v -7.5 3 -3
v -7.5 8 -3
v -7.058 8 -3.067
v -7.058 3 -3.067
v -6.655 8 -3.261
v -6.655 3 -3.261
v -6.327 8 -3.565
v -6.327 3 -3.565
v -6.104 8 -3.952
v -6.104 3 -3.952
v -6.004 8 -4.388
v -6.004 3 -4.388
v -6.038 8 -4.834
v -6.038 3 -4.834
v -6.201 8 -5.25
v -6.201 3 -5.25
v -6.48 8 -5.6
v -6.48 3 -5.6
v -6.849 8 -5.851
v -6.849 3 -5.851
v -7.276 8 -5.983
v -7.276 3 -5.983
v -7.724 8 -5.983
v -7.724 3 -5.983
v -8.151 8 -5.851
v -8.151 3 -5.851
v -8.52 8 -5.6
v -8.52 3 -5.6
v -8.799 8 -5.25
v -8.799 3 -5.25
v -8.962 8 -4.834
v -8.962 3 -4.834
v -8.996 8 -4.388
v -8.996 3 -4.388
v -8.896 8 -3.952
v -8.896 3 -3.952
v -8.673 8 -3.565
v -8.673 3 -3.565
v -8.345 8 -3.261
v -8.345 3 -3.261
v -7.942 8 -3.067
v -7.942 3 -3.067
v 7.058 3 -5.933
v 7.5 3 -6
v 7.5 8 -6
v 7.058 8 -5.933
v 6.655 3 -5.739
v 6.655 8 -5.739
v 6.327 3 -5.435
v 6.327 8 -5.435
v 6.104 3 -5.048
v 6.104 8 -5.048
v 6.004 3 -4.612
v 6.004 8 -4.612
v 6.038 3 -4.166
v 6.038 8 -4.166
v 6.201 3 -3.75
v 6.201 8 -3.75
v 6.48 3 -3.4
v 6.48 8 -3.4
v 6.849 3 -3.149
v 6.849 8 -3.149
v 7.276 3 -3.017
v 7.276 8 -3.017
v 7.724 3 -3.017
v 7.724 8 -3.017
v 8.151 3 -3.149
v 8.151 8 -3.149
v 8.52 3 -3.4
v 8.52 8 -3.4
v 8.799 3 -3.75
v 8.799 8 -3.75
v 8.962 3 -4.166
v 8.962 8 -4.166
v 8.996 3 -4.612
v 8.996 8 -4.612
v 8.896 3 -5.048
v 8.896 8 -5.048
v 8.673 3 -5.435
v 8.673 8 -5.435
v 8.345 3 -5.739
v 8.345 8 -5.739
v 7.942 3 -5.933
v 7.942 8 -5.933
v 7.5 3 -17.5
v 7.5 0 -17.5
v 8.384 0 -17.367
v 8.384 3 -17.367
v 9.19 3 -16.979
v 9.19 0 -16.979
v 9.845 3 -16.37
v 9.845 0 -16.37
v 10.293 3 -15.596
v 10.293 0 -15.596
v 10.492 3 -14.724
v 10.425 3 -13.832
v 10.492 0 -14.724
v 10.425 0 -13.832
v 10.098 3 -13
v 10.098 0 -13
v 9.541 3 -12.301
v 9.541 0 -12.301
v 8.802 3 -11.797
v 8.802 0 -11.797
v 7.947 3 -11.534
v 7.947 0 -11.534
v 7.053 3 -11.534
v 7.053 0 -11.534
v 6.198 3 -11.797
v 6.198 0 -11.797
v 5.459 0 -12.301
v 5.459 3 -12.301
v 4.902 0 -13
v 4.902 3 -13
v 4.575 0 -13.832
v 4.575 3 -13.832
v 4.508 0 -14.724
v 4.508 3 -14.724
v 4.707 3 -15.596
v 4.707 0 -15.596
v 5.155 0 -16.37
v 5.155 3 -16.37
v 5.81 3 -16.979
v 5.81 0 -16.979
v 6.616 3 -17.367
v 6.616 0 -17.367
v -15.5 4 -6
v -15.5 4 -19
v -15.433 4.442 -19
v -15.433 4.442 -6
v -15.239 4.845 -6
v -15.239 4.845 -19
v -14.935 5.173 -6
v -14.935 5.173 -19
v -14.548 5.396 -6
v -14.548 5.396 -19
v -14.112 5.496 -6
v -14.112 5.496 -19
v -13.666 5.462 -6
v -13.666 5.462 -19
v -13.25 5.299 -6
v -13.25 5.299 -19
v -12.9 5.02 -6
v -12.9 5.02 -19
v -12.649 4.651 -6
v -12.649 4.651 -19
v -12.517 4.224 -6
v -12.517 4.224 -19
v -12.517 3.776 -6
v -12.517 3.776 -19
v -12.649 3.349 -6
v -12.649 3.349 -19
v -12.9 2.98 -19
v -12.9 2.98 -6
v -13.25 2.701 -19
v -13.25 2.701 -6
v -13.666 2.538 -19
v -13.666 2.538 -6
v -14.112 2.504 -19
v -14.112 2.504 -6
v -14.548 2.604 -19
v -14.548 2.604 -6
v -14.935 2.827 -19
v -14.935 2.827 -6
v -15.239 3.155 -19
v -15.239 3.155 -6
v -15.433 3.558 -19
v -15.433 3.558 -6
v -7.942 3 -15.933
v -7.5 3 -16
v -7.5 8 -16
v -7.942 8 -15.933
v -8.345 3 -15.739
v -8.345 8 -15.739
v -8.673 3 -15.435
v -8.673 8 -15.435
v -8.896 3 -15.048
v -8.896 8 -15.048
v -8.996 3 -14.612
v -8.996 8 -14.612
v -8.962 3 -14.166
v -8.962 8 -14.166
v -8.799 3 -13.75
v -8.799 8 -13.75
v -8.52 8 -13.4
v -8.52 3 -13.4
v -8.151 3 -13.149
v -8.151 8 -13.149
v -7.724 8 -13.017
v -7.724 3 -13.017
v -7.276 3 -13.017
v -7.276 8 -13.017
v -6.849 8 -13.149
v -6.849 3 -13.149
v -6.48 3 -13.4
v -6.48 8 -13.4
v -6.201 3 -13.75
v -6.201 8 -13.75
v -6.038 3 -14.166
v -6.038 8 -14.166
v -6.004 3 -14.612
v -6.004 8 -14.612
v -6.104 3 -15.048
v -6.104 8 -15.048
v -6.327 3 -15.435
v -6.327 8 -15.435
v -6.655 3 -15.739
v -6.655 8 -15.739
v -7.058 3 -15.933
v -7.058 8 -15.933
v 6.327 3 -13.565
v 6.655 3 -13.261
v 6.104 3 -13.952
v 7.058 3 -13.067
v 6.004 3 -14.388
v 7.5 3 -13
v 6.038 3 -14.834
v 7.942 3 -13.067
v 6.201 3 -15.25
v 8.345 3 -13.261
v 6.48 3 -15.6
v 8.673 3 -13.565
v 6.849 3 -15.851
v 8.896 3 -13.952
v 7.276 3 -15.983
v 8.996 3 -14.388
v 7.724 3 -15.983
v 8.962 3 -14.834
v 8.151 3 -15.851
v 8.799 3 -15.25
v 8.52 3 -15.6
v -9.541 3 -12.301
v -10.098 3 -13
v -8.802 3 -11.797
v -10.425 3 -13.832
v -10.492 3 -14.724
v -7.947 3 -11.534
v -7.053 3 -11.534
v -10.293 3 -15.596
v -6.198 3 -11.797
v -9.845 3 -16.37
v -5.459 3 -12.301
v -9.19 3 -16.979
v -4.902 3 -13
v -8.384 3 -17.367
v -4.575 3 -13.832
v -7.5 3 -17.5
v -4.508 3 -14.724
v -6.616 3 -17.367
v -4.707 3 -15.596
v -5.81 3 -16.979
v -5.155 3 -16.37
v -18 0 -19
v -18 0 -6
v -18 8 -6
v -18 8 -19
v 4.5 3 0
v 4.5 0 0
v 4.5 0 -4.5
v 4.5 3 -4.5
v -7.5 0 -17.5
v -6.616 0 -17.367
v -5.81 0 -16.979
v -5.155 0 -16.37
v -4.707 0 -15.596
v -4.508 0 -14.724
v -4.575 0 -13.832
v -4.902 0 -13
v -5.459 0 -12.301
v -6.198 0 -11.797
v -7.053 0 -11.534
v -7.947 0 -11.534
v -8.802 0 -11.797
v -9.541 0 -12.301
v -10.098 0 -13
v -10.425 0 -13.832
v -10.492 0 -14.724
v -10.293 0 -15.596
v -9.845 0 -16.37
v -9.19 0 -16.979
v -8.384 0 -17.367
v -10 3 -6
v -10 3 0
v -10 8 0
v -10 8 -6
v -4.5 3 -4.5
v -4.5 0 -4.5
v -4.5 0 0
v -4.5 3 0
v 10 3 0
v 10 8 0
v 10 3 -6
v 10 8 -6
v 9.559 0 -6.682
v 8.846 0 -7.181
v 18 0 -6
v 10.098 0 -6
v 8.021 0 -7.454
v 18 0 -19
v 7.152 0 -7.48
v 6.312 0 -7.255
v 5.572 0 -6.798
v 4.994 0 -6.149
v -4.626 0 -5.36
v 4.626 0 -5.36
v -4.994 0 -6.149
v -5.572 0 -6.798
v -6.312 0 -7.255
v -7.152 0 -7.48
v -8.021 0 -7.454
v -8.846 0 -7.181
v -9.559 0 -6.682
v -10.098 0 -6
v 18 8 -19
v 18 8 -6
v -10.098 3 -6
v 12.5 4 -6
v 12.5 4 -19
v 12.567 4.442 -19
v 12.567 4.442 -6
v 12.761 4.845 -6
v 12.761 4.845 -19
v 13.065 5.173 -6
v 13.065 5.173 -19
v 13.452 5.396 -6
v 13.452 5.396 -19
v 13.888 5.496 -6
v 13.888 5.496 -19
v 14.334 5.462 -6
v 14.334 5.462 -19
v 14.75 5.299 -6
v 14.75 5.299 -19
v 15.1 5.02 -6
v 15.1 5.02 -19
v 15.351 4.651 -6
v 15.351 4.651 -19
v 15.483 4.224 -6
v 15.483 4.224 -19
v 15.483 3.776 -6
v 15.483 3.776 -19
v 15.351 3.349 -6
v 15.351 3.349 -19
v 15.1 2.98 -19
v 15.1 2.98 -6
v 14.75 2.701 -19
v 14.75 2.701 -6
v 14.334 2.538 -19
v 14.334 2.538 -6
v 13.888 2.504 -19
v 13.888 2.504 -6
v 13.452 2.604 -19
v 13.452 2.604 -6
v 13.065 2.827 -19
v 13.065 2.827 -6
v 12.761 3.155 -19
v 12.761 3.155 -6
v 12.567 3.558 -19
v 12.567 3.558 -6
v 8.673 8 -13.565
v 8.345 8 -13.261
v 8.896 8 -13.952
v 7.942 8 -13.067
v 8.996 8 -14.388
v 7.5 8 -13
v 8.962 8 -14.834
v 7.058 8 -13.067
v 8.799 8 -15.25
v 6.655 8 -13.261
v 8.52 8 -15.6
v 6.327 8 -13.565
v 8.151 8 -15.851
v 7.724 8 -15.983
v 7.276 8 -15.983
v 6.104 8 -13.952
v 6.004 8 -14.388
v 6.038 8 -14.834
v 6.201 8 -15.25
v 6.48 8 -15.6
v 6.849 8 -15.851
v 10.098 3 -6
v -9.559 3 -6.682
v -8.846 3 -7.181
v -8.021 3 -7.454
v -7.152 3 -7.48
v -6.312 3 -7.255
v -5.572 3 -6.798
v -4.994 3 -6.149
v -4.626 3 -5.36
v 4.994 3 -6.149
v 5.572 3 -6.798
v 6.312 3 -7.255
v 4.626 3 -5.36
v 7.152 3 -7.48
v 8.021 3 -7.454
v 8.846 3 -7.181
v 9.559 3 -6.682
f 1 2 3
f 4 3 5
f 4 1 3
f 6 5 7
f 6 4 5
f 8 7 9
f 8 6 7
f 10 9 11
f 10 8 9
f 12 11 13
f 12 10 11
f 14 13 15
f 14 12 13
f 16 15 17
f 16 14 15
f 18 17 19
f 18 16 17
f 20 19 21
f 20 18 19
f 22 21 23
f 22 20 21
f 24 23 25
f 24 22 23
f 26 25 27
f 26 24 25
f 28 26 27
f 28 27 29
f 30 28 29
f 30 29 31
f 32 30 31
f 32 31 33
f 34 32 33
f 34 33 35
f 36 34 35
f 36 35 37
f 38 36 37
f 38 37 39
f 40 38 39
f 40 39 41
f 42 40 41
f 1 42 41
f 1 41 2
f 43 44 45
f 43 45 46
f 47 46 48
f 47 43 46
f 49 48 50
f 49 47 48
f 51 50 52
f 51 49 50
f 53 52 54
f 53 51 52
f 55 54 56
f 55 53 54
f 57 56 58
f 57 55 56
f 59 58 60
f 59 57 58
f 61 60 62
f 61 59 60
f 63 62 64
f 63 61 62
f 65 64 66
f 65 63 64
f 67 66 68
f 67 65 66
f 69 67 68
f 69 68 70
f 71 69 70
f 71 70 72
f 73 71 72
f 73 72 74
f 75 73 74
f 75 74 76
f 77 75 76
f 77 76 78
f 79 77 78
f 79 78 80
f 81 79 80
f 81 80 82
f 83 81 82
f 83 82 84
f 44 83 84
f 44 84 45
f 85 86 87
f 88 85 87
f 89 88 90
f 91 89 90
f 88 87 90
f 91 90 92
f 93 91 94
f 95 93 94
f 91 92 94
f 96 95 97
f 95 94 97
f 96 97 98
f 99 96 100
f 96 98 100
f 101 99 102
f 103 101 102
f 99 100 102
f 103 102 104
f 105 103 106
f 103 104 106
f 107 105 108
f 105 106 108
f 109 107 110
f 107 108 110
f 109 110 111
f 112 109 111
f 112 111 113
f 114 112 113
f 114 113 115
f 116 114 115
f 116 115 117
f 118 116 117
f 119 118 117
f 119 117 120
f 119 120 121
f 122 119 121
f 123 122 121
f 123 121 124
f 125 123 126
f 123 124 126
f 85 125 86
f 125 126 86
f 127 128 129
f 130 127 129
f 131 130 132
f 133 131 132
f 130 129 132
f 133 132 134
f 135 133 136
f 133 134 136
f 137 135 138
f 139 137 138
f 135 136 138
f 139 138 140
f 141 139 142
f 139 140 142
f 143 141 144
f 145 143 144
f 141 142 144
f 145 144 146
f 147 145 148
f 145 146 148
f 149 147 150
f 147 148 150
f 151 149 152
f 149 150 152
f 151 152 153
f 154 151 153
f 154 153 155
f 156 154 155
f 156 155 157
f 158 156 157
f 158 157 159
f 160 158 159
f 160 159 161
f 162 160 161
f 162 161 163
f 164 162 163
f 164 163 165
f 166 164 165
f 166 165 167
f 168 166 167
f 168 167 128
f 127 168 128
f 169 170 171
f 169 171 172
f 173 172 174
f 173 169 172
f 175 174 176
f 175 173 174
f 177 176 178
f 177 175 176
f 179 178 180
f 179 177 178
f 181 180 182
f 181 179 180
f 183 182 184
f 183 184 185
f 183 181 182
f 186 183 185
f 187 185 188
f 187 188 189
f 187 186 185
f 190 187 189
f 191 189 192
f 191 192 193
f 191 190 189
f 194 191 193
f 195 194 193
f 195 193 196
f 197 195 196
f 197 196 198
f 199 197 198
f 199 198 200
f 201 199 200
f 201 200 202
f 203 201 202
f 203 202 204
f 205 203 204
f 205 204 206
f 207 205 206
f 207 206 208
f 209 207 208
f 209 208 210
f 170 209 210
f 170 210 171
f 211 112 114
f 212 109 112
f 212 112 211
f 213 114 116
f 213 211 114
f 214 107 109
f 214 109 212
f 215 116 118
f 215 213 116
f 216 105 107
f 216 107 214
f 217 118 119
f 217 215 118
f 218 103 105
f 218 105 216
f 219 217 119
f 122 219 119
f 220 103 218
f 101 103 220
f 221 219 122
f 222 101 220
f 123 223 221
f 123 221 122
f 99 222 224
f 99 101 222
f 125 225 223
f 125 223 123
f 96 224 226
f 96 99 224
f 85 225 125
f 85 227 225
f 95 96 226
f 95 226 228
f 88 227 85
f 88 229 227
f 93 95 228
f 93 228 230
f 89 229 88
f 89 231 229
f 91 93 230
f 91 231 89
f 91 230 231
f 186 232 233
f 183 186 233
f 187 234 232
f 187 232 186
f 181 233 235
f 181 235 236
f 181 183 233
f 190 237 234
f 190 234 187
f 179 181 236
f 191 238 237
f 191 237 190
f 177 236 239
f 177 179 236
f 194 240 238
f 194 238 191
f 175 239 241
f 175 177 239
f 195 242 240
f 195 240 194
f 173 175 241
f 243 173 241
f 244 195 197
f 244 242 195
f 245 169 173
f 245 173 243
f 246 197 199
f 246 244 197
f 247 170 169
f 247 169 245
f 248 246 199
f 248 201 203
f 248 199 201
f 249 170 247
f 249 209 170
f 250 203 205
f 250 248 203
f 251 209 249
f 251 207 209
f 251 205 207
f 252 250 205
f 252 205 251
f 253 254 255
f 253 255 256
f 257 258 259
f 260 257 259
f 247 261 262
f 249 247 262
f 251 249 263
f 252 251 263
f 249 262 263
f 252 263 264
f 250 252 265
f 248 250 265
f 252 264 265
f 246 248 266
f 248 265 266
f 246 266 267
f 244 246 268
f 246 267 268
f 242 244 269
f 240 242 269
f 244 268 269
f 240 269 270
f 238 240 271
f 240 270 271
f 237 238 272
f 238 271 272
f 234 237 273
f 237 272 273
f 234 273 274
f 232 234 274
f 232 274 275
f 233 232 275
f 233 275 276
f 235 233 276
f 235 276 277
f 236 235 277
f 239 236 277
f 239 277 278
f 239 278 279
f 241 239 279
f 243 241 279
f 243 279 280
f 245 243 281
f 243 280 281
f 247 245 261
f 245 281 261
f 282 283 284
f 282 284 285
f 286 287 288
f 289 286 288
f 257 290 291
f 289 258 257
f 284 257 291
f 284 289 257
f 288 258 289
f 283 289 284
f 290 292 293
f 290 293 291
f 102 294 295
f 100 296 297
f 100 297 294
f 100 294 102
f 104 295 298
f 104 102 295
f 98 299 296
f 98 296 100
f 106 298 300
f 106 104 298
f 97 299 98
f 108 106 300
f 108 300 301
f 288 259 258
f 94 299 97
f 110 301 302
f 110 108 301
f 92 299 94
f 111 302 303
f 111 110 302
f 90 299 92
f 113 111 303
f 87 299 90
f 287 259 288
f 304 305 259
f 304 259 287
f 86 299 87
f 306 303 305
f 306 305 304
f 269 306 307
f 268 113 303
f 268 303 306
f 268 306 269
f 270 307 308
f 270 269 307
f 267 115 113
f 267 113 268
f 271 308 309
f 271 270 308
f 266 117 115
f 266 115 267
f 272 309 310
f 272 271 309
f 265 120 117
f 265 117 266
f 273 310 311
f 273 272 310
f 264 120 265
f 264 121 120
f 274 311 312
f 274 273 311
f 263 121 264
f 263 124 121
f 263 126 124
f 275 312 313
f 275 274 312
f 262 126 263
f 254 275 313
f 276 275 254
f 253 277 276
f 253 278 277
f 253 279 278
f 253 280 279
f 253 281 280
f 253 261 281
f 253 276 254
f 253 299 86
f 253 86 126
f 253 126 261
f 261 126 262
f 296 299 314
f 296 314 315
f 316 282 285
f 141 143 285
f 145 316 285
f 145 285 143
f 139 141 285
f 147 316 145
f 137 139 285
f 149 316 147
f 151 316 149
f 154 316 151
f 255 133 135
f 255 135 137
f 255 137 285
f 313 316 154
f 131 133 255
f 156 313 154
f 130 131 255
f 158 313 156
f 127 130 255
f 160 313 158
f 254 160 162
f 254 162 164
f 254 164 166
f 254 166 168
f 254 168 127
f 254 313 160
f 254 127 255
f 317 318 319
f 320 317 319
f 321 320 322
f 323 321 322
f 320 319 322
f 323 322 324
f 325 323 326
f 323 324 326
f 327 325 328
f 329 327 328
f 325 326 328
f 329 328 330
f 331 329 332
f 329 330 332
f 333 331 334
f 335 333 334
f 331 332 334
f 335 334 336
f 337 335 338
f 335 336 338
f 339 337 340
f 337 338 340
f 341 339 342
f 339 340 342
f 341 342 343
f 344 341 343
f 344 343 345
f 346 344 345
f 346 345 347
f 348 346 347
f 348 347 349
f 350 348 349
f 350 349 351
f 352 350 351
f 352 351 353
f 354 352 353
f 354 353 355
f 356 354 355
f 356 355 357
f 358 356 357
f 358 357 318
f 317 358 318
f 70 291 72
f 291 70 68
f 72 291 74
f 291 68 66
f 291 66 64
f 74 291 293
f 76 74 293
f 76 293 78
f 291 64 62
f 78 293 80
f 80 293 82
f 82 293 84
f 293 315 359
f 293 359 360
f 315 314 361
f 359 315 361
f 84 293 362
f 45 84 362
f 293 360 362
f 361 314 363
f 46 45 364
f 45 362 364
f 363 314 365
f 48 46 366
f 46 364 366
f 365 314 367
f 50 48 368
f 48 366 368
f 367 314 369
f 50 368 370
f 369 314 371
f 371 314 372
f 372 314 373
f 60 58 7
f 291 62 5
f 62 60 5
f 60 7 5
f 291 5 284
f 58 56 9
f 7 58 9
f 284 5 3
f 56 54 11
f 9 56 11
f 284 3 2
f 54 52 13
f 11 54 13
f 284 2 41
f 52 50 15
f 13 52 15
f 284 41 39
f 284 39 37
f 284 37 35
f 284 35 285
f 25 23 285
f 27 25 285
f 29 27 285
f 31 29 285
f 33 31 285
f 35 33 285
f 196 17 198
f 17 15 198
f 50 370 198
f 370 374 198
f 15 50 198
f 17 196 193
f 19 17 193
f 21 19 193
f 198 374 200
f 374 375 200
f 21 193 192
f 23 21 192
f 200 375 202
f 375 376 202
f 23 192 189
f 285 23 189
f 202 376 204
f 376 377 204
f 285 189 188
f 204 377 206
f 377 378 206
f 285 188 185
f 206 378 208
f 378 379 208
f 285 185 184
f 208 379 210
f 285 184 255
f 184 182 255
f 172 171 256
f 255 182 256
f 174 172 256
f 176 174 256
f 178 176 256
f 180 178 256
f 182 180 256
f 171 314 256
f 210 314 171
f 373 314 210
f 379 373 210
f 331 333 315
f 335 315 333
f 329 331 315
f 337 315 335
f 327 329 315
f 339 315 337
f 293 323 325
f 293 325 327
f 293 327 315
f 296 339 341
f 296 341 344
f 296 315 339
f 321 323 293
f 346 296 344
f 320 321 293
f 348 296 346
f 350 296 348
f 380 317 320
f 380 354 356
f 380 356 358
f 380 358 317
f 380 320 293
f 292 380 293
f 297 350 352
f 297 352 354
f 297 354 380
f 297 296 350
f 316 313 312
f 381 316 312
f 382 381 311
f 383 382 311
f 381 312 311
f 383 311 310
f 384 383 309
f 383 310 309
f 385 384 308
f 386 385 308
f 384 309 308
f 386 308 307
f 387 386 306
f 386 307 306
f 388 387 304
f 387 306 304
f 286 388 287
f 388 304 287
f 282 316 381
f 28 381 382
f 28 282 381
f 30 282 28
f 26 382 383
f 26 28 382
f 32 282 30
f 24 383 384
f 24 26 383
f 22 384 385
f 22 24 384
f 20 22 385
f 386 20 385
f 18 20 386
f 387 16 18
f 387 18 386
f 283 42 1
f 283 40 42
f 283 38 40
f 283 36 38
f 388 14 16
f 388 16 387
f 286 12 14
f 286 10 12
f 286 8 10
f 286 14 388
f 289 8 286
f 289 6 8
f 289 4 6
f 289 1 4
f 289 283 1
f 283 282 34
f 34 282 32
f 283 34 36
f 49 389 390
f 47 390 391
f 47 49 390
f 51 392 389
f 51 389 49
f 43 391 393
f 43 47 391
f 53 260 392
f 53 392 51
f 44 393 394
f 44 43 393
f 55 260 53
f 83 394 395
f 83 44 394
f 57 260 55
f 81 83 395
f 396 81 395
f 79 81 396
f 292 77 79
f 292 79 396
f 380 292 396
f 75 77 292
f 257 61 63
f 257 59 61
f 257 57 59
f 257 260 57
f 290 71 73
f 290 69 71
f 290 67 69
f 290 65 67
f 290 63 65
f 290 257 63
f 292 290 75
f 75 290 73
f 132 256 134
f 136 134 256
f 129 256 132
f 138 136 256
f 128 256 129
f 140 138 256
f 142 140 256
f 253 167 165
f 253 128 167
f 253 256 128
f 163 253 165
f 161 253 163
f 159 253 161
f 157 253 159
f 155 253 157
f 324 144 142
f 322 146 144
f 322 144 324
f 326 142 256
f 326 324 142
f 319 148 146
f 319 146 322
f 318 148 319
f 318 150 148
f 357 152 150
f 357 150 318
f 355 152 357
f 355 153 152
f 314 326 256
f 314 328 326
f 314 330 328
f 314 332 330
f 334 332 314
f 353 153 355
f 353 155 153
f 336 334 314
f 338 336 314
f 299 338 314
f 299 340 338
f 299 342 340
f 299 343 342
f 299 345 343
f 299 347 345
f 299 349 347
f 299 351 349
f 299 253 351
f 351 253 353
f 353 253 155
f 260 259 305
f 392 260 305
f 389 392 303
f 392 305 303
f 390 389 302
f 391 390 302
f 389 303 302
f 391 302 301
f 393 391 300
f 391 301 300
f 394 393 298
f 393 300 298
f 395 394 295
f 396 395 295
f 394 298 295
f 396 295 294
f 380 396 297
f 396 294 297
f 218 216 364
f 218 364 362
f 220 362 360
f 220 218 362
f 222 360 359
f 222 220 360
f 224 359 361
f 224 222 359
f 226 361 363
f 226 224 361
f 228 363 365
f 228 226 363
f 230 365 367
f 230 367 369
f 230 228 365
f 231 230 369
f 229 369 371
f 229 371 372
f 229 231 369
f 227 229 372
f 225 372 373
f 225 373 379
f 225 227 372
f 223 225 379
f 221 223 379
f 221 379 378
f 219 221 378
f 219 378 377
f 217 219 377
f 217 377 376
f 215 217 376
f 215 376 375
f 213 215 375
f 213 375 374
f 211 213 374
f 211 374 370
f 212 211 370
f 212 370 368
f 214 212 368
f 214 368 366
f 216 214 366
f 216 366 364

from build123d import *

# Parameters (mm, degrees)
SKETCH_1_R          = 1.5
EXTRUDE_1_DEPTH     = 8
SKETCH_2_R          = 1.5
CUT_EXTRUDE_1_DEPTH = 28.367864367
SKETCH_3_R          = 3
CUT_EXTRUDE_2_DEPTH = 3
CUT_EXTRUDE_3_DEPTH = 3


with BuildPart() as part:
    # 草图1 → 凸台-拉伸1 (new body)
    with BuildSketch(Plane(origin=(0, 0, 0), x_dir=(1, 0, 0), z_dir=(0, 1, 0))):
        Polygon((-18, 19), (18, 19), (18, 6), (10, 6), (10, 0), (-10, 0), (-10, 6), (-18, 6), align=None)
        with Locations(Location((7.5, 14.5, 0), (0, 0, 270))):
            Circle(SKETCH_1_R, mode=Mode.SUBTRACT)
        with Locations(Location((7.5, 4.5, 0), (0, 0, 90))):
            Circle(SKETCH_1_R, mode=Mode.SUBTRACT)
        with Locations(Location((-7.5, 4.5, 0), (0, 0, 270))):
            Circle(SKETCH_1_R, mode=Mode.SUBTRACT)
        with Locations(Location((-7.5, 14.5, 0), (0, 0, 90))):
            Circle(SKETCH_1_R, mode=Mode.SUBTRACT)
    extrude(amount=EXTRUDE_1_DEPTH)

    # 草图2 → 切除-拉伸1 (cut, through all)
    with BuildSketch(Plane(origin=(0, 0, -19), x_dir=(-1, 0, 0), z_dir=(0, 0, -1))):
        with Locations((-14, 4)):
            Circle(SKETCH_2_R)
        with Locations((14, 4)):
            Circle(SKETCH_2_R)
    extrude(amount=-CUT_EXTRUDE_1_DEPTH, mode=Mode.SUBTRACT)

    # 草图3 → 切除-拉伸2 (cut)
    with BuildSketch(Plane.XZ):
        with Locations(Location((-7.5, -14.5, 0), (0, 0, 270))):
            Circle(SKETCH_3_R)
        with Locations(Location((7.5, -14.5, 0), (0, 0, 270))):
            Circle(SKETCH_3_R)
    extrude(amount=-CUT_EXTRUDE_2_DEPTH, mode=Mode.SUBTRACT)

    # 草图4 → 切除-拉伸3 (cut)
    with BuildSketch(Plane.XZ):
        with BuildLine():
            ThreePointArc((-10, -2.841687605), (-6.633974596, -1.627718677), (-4.5, -4.5))
            Line((-4.5, -4.5), (-4.5, 0))
            Line((-4.5, 0), (-10, 0))
            Line((-10, 0), (-10, -2.841687605))
        make_face()
        with BuildLine():
            Line((-6, -4.5), (-4.5, -4.5))
            ThreePointArc((-4.5, -4.5), (-6.633974596, -1.627718677), (-10, -2.841687605))
            Line((-10, -2.841687605), (-10, -4.5))
            Line((-10, -4.5), (-9, -4.5))
            ThreePointArc((-9, -4.5), (-7.5, -3), (-6, -4.5))
        make_face()
        with BuildLine():
            ThreePointArc((-10.098076211, -6), (-6.723542865, -7.397777479), (-4.5, -4.5))
            Line((-4.5, -4.5), (-6, -4.5))
            ThreePointArc((-6, -4.5), (-7.5, -6), (-9, -4.5))
            Line((-9, -4.5), (-10, -4.5))
            Line((-10, -4.5), (-10, -6))
            Line((-10, -6), (-10.098076211, -6))
        make_face()
        with BuildLine():
            ThreePointArc((10, -2.841687605), (6.633974596, -1.627718677), (4.5, -4.5))
            Line((4.5, -4.5), (6, -4.5))
            ThreePointArc((6, -4.5), (7.5, -3), (9, -4.5))
            Line((9, -4.5), (10, -4.5))
            Line((10, -4.5), (10, -2.841687605))
        make_face()
        with BuildLine():
            Line((6, -4.5), (4.5, -4.5))
            ThreePointArc((4.5, -4.5), (6.723542865, -7.397777479), (10.098076211, -6))
            Line((10.098076211, -6), (10, -6))
            Line((10, -6), (10, -4.5))
            Line((10, -4.5), (9, -4.5))
            ThreePointArc((9, -4.5), (7.5, -6), (6, -4.5))
        make_face()
        with BuildLine():
            Line((10, 0), (4.5, 0))
            Line((4.5, 0), (4.5, -4.5))
            ThreePointArc((4.5, -4.5), (6.633974596, -1.627718677), (10, -2.841687605))
            Line((10, -2.841687605), (10, 0))
        make_face()
    extrude(amount=-CUT_EXTRUDE_3_DEPTH, mode=Mode.SUBTRACT)


solid = part.part
